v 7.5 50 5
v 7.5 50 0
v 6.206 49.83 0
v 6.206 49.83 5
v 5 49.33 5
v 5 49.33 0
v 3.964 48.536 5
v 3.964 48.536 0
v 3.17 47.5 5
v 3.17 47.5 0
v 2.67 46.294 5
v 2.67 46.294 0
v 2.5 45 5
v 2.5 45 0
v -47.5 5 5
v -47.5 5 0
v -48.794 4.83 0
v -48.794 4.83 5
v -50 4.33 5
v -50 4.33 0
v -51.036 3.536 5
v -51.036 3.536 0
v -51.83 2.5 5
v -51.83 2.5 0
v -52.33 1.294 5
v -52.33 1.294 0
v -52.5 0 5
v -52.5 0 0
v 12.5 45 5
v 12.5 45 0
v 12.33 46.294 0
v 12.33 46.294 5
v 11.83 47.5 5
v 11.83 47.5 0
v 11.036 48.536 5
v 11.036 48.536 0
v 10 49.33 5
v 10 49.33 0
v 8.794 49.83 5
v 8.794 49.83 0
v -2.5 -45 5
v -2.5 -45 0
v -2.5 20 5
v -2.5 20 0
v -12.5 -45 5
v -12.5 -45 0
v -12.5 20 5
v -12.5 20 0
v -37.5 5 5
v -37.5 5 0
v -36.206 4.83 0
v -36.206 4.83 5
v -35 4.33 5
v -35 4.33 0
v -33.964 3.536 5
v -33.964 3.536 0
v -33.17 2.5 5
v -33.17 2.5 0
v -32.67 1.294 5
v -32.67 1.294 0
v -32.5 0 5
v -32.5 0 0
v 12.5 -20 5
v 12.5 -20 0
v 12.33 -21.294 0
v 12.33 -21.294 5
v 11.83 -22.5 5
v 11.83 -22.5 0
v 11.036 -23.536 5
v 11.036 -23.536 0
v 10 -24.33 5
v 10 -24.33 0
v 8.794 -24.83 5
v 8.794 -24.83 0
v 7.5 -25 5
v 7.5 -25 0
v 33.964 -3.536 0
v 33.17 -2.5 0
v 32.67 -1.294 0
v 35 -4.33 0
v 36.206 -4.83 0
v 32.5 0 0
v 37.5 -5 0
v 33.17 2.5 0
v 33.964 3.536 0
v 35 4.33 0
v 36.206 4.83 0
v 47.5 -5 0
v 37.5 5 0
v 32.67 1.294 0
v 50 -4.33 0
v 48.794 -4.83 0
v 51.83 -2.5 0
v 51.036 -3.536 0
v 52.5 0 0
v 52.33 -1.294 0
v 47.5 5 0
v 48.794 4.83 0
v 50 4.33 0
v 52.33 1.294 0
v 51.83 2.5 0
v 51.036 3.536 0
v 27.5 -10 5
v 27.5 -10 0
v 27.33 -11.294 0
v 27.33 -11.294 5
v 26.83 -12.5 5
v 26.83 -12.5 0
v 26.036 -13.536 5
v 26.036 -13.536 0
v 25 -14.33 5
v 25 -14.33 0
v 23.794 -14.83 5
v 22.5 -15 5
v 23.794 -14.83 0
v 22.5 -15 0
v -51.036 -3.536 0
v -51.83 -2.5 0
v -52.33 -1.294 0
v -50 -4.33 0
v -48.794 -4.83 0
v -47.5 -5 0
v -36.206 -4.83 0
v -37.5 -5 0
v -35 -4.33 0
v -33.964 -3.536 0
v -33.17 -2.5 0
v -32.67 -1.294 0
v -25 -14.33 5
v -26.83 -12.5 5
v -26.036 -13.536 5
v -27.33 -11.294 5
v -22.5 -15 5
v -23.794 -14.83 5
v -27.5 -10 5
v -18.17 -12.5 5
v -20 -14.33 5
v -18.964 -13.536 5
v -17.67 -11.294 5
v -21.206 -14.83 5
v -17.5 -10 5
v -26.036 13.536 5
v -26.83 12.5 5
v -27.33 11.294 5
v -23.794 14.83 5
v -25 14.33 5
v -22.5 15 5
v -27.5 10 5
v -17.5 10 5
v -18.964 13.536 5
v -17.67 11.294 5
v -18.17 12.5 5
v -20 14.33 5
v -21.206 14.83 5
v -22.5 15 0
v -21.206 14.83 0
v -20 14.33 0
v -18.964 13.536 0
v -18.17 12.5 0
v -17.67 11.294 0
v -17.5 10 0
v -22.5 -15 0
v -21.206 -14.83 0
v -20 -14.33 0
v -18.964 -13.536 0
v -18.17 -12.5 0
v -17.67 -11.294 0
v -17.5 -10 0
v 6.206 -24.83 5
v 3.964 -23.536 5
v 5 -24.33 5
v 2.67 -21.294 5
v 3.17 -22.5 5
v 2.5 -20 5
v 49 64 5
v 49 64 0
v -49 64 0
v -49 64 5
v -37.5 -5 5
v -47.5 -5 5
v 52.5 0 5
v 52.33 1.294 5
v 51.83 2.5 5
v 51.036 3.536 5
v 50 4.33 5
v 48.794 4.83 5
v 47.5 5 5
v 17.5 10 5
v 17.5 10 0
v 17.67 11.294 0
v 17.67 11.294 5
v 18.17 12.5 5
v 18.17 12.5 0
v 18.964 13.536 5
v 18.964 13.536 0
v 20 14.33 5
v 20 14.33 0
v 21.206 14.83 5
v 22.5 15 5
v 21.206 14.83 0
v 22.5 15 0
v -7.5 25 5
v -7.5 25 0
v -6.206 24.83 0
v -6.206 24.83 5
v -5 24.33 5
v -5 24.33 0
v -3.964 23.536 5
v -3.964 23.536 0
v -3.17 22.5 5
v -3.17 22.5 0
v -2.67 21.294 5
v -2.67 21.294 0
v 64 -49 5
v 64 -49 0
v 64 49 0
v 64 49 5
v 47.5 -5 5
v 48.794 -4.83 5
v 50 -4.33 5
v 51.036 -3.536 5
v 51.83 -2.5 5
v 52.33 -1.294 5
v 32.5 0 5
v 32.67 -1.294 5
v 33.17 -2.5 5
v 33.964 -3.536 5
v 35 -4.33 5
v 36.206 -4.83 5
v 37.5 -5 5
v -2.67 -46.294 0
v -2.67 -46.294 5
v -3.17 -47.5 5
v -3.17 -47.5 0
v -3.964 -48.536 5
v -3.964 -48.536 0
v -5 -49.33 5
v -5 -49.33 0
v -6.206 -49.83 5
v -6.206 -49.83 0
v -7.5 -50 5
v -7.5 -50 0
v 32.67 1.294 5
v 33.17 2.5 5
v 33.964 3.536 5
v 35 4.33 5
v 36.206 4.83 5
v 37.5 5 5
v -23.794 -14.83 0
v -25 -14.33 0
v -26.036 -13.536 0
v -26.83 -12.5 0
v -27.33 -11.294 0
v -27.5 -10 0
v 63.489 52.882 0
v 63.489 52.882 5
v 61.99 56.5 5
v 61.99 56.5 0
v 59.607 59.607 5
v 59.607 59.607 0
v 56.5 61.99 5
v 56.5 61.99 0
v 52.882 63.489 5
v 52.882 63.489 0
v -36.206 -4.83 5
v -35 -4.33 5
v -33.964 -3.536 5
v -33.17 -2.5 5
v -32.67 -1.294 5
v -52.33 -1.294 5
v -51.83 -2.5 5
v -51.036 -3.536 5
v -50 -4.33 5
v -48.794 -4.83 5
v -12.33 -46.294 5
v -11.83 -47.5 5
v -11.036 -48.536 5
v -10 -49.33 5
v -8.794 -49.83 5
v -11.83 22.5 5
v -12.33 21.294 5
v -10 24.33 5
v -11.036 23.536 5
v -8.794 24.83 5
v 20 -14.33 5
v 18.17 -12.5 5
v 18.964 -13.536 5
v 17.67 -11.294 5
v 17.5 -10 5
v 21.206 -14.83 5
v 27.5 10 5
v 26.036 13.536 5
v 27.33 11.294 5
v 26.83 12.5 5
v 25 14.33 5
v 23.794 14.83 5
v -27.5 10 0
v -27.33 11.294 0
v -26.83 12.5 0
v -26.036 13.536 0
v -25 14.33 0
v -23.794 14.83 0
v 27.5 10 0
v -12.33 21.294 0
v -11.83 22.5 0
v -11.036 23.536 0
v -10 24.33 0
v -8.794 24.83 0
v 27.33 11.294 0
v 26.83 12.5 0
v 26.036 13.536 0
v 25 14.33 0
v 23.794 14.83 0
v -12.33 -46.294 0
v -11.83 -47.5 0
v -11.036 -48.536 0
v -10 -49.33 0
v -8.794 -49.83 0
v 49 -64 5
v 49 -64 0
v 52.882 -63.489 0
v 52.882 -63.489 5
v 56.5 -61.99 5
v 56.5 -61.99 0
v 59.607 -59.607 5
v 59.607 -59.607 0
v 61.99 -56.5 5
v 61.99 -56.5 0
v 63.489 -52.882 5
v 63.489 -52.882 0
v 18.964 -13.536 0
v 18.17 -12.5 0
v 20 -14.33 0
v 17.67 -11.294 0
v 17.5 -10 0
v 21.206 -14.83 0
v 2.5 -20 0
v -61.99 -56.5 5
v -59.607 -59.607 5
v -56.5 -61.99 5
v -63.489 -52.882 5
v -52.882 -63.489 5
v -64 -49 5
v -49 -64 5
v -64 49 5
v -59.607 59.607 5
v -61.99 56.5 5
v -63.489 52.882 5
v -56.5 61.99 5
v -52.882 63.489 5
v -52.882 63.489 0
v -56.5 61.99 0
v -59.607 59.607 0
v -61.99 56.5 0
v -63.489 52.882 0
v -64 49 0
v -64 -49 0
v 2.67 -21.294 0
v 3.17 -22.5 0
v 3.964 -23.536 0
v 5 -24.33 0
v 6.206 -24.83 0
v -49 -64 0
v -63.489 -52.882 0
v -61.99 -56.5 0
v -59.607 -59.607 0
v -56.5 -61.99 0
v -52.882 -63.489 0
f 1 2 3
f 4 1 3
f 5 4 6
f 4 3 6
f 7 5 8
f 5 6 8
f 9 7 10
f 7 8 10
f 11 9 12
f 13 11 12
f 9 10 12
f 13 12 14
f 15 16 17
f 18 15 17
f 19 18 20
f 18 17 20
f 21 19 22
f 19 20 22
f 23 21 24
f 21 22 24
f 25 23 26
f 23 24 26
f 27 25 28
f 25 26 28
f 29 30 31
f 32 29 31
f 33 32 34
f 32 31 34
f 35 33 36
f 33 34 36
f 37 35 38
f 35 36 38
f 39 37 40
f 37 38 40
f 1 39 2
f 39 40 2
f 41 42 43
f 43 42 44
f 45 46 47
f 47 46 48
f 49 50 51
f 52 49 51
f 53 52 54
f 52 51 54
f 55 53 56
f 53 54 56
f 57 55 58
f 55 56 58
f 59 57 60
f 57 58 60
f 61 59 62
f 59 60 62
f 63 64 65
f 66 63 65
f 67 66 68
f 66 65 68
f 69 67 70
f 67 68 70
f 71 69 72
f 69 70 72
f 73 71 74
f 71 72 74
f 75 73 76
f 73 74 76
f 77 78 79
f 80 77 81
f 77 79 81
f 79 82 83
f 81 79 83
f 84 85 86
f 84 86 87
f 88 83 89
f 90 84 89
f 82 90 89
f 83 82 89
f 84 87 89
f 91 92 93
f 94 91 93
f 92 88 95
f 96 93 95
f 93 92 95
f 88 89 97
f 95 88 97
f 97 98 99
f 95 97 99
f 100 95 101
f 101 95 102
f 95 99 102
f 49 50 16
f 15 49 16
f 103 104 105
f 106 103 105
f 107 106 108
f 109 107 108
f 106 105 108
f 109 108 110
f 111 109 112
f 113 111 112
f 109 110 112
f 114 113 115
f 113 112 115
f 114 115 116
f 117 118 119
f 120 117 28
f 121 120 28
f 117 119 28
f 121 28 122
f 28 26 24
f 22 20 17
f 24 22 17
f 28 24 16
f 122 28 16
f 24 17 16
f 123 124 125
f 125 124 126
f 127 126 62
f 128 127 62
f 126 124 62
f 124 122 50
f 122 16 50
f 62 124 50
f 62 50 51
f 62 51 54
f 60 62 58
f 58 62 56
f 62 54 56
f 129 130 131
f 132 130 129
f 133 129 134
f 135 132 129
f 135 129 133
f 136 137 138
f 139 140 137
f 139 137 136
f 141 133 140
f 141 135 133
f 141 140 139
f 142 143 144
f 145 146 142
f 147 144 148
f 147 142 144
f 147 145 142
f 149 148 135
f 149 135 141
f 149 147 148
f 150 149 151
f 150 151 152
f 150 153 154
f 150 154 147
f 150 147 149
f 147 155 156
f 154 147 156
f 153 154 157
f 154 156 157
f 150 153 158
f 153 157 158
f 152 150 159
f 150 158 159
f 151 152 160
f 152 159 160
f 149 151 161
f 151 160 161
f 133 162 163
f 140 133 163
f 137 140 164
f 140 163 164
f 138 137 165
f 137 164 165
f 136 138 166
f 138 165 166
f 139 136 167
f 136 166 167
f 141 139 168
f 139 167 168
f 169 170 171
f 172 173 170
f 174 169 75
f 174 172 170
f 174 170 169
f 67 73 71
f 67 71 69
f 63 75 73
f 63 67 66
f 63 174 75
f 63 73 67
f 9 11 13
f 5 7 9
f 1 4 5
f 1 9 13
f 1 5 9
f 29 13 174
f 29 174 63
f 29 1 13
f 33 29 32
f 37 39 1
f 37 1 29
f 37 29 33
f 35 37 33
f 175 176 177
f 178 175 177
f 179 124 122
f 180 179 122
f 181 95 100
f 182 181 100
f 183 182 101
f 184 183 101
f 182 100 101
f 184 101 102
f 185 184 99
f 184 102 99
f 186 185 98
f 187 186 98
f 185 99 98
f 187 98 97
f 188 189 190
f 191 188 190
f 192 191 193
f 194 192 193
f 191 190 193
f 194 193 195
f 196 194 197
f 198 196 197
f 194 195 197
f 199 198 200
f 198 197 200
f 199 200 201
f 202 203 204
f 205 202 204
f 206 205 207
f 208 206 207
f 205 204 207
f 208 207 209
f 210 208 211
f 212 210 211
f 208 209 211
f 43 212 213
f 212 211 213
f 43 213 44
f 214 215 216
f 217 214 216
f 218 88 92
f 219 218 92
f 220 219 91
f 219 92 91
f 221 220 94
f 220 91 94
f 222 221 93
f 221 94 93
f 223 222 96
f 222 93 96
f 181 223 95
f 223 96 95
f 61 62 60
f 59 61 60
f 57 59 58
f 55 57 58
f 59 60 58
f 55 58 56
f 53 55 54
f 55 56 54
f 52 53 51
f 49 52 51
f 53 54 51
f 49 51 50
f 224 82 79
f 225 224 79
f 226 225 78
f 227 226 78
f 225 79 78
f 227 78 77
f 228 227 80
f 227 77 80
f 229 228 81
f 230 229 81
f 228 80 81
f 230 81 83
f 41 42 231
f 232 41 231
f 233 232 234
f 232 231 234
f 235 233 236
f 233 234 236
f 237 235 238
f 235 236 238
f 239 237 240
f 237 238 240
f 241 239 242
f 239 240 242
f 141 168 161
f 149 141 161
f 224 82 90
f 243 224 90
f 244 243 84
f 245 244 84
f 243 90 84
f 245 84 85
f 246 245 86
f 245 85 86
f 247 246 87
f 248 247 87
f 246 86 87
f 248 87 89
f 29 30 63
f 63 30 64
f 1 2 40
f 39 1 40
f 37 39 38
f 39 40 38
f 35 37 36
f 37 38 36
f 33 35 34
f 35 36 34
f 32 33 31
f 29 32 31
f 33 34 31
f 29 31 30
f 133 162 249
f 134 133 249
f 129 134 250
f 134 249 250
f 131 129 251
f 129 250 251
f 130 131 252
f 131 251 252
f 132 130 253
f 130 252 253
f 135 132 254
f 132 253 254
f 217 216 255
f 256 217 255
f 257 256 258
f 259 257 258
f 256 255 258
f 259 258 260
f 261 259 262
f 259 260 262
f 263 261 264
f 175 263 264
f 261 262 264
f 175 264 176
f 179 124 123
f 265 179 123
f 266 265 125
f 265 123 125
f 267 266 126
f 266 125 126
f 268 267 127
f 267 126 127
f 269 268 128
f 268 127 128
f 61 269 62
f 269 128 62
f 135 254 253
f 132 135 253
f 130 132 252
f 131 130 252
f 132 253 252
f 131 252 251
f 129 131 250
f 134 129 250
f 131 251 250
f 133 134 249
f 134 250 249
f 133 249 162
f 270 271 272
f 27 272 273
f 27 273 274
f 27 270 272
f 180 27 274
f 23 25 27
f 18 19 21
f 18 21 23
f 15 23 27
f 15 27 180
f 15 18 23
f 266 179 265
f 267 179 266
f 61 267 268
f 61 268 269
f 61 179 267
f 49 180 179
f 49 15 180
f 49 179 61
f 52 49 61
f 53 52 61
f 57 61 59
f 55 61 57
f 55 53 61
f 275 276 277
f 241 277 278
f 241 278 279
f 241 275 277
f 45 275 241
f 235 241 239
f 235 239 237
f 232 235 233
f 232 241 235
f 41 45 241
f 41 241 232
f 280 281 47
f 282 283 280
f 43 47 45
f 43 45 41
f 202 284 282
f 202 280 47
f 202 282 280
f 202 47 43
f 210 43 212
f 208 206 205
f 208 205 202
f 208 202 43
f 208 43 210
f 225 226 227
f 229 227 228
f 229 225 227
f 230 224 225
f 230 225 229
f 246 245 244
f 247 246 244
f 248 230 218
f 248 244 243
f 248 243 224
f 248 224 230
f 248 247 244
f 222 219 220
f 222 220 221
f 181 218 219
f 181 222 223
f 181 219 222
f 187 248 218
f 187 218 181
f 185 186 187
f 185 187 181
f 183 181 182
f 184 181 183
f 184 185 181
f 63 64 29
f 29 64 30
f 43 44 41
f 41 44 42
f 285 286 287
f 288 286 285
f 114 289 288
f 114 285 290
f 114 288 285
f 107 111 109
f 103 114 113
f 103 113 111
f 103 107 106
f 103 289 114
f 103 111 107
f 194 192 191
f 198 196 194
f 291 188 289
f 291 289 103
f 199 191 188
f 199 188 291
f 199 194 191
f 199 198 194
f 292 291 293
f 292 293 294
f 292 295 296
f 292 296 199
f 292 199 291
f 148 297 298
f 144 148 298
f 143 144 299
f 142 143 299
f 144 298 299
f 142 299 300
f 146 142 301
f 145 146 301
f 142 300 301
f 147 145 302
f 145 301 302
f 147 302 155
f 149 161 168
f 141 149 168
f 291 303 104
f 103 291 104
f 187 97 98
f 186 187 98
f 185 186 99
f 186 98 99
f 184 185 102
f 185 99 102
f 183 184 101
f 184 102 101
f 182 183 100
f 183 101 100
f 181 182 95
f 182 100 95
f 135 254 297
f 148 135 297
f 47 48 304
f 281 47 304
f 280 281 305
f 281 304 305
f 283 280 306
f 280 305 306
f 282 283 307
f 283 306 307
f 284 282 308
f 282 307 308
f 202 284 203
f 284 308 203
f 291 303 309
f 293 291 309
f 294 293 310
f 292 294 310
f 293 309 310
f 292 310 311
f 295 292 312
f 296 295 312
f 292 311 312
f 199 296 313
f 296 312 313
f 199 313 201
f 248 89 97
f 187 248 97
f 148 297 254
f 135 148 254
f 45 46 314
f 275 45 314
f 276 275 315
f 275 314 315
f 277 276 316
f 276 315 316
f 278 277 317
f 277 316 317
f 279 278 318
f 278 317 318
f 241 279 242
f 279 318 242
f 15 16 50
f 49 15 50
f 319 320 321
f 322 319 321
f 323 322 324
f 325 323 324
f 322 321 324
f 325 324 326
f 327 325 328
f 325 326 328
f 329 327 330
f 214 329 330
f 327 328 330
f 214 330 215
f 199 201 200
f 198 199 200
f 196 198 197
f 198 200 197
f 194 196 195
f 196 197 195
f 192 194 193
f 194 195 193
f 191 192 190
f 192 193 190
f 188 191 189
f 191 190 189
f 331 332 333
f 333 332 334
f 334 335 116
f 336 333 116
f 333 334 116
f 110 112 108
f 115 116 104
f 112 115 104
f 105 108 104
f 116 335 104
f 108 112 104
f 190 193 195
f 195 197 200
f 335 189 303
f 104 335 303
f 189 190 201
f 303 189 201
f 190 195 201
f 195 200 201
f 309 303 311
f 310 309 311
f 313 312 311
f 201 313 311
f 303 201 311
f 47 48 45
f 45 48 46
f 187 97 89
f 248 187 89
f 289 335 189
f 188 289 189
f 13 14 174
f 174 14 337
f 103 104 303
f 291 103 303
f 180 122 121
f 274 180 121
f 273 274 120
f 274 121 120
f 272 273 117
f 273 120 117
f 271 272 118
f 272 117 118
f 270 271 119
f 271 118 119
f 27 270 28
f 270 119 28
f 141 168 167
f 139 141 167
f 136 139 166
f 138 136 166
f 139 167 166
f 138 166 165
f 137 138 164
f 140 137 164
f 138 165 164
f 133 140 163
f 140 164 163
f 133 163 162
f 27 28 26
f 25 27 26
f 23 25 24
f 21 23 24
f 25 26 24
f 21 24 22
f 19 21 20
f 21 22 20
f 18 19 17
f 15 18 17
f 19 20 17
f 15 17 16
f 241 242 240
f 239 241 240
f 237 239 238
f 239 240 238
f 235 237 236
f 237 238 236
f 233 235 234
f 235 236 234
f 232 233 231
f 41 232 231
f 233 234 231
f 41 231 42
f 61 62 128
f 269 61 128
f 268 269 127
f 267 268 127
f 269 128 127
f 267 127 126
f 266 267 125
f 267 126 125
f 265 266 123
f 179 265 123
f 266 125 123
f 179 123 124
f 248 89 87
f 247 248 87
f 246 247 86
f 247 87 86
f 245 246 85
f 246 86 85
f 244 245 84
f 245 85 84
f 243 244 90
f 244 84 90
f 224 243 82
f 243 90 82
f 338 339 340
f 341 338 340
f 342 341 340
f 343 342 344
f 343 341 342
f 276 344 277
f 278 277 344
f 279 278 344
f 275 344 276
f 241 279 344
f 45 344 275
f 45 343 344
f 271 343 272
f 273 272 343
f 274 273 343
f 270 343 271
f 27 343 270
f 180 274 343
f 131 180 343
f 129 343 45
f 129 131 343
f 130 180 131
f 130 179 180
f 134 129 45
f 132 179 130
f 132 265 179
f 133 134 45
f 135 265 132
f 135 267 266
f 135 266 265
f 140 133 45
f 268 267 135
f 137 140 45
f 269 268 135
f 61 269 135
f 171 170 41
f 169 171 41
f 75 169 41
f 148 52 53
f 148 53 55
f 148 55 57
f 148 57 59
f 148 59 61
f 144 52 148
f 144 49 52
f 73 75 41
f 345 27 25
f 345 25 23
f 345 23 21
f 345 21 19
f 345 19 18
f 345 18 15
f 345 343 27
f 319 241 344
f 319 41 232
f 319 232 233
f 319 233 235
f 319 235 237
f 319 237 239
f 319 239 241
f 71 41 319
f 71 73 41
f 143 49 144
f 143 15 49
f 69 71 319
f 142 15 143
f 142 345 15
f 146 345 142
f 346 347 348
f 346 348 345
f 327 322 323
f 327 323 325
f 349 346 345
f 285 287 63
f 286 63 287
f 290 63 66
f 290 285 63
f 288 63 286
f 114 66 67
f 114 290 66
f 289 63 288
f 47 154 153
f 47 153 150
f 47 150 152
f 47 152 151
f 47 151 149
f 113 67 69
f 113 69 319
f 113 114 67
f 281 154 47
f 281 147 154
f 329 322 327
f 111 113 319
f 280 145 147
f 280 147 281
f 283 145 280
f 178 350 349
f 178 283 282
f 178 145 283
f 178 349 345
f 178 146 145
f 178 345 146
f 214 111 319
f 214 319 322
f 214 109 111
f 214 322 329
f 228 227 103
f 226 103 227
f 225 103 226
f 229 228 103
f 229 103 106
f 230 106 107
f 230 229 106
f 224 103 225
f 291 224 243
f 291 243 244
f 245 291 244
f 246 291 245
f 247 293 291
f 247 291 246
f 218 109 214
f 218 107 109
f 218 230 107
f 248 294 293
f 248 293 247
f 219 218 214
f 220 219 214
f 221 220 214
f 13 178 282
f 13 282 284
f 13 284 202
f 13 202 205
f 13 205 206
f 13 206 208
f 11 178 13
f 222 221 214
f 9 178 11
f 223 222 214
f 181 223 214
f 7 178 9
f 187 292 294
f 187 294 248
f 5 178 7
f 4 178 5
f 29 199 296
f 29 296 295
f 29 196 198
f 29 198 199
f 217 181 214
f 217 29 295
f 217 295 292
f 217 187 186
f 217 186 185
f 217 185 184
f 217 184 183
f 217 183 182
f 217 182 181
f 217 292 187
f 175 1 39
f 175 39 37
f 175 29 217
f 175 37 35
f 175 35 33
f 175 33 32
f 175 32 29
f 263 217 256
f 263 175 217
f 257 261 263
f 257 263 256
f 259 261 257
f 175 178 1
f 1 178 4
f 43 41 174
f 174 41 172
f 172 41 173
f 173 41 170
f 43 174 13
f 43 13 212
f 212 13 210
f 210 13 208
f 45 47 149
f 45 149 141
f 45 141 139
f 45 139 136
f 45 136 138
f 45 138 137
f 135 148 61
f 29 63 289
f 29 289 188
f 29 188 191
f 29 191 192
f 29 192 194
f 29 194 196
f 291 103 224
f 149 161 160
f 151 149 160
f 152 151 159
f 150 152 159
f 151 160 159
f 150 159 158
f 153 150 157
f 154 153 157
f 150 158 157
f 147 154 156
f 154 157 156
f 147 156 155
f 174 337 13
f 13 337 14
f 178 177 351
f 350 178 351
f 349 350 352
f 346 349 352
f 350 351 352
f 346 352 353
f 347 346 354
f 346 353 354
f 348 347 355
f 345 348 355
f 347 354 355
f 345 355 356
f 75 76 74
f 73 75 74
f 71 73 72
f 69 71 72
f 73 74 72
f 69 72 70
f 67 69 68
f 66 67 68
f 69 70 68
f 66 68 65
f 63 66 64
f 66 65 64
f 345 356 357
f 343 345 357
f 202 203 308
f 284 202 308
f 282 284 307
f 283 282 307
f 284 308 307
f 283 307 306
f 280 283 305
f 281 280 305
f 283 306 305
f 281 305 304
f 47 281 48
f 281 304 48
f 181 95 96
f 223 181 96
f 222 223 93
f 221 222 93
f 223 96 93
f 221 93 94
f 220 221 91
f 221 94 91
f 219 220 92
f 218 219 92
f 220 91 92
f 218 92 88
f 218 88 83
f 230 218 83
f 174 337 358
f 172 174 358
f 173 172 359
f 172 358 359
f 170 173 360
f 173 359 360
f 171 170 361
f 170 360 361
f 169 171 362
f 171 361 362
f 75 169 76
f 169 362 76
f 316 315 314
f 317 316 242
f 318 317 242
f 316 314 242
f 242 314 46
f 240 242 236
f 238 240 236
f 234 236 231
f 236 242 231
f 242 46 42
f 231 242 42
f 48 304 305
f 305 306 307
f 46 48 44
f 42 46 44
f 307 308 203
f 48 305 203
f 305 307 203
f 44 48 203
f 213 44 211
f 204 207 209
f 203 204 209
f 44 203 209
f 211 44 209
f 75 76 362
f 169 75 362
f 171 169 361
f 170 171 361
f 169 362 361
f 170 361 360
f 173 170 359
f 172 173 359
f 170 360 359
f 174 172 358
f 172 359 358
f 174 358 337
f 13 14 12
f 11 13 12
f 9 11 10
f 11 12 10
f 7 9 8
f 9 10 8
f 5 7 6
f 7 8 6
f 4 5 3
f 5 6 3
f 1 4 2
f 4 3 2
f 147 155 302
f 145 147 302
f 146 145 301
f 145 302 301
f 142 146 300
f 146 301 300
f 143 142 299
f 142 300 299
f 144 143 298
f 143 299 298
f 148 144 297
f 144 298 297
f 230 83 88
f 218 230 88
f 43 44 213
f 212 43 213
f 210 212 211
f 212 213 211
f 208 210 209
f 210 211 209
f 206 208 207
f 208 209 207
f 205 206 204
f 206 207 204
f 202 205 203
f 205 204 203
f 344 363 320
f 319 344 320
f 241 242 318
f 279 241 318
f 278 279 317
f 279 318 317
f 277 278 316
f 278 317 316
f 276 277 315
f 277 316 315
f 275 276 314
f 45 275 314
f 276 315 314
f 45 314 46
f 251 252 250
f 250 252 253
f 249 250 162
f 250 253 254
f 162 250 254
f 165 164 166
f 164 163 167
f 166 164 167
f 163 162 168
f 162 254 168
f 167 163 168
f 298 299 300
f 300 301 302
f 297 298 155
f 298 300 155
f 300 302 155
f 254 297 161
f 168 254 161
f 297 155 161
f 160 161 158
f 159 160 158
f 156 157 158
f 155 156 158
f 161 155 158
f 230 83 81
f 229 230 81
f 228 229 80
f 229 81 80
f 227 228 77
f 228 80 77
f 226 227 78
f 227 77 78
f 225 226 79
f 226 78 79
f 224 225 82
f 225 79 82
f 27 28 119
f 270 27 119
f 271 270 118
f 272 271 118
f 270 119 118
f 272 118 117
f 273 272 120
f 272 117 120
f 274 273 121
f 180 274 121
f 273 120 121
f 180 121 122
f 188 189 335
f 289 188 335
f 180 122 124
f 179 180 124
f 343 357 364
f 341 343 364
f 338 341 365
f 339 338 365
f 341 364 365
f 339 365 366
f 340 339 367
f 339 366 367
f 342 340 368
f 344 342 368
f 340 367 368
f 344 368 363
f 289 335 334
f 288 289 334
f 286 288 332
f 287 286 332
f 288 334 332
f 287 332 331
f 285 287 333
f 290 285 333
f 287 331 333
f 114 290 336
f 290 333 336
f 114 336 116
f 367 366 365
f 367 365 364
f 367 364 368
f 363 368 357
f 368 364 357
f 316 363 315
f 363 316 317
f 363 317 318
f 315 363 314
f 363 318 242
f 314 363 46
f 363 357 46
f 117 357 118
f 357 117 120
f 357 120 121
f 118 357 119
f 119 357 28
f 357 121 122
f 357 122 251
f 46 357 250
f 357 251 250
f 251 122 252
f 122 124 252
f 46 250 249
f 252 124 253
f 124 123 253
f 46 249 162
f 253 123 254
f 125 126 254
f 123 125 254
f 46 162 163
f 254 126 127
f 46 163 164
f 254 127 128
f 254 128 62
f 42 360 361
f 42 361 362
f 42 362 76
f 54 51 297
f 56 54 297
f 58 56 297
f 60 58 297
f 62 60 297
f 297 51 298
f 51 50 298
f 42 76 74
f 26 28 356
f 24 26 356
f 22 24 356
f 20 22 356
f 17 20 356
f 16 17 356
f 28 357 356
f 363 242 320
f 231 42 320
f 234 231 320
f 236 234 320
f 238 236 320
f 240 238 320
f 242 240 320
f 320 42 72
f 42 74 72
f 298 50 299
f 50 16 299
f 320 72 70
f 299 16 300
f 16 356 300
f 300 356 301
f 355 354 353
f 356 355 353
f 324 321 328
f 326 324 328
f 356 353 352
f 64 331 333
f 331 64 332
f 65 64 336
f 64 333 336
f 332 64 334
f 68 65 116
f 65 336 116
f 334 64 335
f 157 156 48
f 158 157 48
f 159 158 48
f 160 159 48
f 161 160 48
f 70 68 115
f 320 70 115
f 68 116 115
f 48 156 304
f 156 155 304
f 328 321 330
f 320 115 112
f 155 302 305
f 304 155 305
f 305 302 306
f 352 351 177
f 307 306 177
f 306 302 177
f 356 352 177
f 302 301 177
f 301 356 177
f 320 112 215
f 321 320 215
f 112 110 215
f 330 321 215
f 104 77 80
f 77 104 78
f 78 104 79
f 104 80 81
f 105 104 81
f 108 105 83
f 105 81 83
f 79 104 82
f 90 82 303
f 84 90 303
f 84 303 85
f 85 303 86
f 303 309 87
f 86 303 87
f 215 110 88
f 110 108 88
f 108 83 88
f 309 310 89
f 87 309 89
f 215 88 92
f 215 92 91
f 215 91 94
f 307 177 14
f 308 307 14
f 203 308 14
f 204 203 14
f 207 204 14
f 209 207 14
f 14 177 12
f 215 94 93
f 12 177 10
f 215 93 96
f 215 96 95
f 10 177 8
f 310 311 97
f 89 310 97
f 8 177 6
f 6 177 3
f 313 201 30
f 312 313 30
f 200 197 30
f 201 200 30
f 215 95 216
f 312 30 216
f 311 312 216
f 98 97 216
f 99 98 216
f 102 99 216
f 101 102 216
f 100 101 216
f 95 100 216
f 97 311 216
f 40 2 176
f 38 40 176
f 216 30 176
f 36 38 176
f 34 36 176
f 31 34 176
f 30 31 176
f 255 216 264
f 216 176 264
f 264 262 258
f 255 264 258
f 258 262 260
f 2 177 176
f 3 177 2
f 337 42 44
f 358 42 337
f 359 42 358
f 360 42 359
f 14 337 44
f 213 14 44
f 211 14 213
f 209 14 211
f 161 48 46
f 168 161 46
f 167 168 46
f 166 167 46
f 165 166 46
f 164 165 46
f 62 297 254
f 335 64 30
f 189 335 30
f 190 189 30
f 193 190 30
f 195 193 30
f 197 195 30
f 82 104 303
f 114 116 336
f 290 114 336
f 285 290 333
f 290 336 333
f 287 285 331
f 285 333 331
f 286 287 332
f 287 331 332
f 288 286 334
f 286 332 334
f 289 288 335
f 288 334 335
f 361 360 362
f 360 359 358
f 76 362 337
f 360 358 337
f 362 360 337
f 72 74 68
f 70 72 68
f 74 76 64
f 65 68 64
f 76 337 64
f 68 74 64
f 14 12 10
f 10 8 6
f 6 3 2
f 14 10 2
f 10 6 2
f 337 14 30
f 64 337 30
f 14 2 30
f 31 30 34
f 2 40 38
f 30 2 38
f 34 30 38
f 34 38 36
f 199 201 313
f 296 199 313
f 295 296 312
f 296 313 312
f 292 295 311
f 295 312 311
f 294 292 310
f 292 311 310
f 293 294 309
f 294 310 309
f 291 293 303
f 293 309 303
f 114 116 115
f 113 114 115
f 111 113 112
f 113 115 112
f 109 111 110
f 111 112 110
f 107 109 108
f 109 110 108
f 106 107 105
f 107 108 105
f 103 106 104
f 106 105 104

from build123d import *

# Parameters (mm, degrees)
F1_DEPTH = 5
F2_DEPTH = 5
F3_DEPTH = 5
F4_DEPTH = 5
F5_DEPTH = 5
F6_DEPTH = 5
F7_DEPTH = 5


with BuildPart() as f1:
    # F0 (on Top) → F1 (new body)
    with BuildSketch(Plane.XY):
        with BuildLine():
            ThreePointArc((64, 49), (59.606602, 59.606602), (49, 64))
            Line((49, 64), (-49, 64))
            ThreePointArc((-49, 64), (-59.606602, 59.606602), (-64, 49))
            Line((-64, 49), (-64, -49))
            ThreePointArc((-64, -49), (-59.606602, -59.606602), (-49, -64))
            Line((-49, -64), (49, -64))
            ThreePointArc((49, -64), (59.606602, -59.606602), (64, -49))
            Line((64, -49), (64, 49))
        make_face()
        with BuildLine():
            ThreePointArc((-7.5, 25), (-3.964466, 23.535534), (-2.5, 20))
            Line((-2.5, 20), (-2.5, -25))
            Line((-2.5, -25), (-2.5, -45))
            ThreePointArc((-2.5, -45), (-3.964466, -48.535534), (-7.5, -50))
            ThreePointArc((-7.5, -50), (-11.035534, -48.535534), (-12.5, -45))
            Line((-12.5, -45), (-12.5, -25))
            Line((-12.5, -25), (-12.5, 20))
            ThreePointArc((-12.5, 20), (-11.035534, 23.535534), (-7.5, 25))
        make_face(mode=Mode.SUBTRACT)
        with BuildLine():
            Line((-47.5, 5), (-37.5, 5))
            ThreePointArc((-37.5, 5), (-33.964466, 3.535534), (-32.5, 0))
            ThreePointArc((-32.5, 0), (-33.964466, -3.535534), (-37.5, -5))
            Line((-37.5, -5), (-47.5, -5))
            ThreePointArc((-47.5, -5), (-51.035534, -3.535534), (-52.5, 0))
            ThreePointArc((-52.5, 0), (-51.035534, 3.535534), (-47.5, 5))
        make_face(mode=Mode.SUBTRACT)
        with BuildLine():
            ThreePointArc((-22.5, 15), (-18.964466, 13.535534), (-17.5, 10))
            Line((-17.5, 10), (-17.5, -10))
            ThreePointArc((-17.5, -10), (-18.964466, -13.535534), (-22.5, -15))
            ThreePointArc((-22.5, -15), (-26.035534, -13.535534), (-27.5, -10))
            Line((-27.5, -10), (-27.5, 10))
            ThreePointArc((-27.5, 10), (-26.035534, 13.535534), (-22.5, 15))
        make_face(mode=Mode.SUBTRACT)
        with BuildLine():
            ThreePointArc((7.5, -25), (3.964466, -23.535534), (2.5, -20))
            Line((2.5, -20), (2.5, 25))
            Line((2.5, 25), (2.5, 45))
            ThreePointArc((2.5, 45), (3.964466, 48.535534), (7.5, 50))
            ThreePointArc((7.5, 50), (11.035534, 48.535534), (12.5, 45))
            Line((12.5, 45), (12.5, 25))
            Line((12.5, 25), (12.5, -20))
            ThreePointArc((12.5, -20), (11.035534, -23.535534), (7.5, -25))
        make_face(mode=Mode.SUBTRACT)
        with BuildLine():
            Line((27.5, 10), (27.5, -10))
            ThreePointArc((27.5, -10), (26.035534, -13.535534), (22.5, -15))
            ThreePointArc((22.5, -15), (18.964466, -13.535534), (17.5, -10))
            Line((17.5, -10), (17.5, 10))
            ThreePointArc((17.5, 10), (18.964466, 13.535534), (22.5, 15))
            ThreePointArc((22.5, 15), (26.035534, 13.535534), (27.5, 10))
        make_face(mode=Mode.SUBTRACT)
        with BuildLine():
            Line((47.5, -5), (37.5, -5))
            ThreePointArc((37.5, -5), (33.964466, -3.535534), (32.5, 0))
            ThreePointArc((32.5, 0), (33.964466, 3.535534), (37.5, 5))
            Line((37.5, 5), (47.5, 5))
            ThreePointArc((47.5, 5), (51.035534, 3.535534), (52.5, 0))
            ThreePointArc((52.5, 0), (51.035534, -3.535534), (47.5, -5))
        make_face(mode=Mode.SUBTRACT)
    extrude(amount=F1_DEPTH)


with BuildPart() as f2:
    # F0 (on Top) → F2 (new body)
    with BuildSketch(Plane.XY):
        with BuildLine():
            ThreePointArc((-32.5, 0), (-33.964466, 3.535534), (-37.5, 5))
            Line((-37.5, 5), (-47.5, 5))
            ThreePointArc((-47.5, 5), (-51.035534, 3.535534), (-52.5, 0))
            ThreePointArc((-52.5, 0), (-51.035534, -3.535534), (-47.5, -5))
            Line((-47.5, -5), (-37.5, -5))
            ThreePointArc((-37.5, -5), (-33.964466, -3.535534), (-32.5, 0))
        make_face()
    extrude(amount=F2_DEPTH)


with BuildPart() as f3:
    # F0 (on Top) → F3 (new body)
    with BuildSketch(Plane.XY):
        with BuildLine():
            Line((-17.5, -10), (-17.5, 10))
            ThreePointArc((-17.5, 10), (-18.964466, 13.535534), (-22.5, 15))
            ThreePointArc((-22.5, 15), (-26.035534, 13.535534), (-27.5, 10))
            Line((-27.5, 10), (-27.5, -10))
            ThreePointArc((-27.5, -10), (-26.035534, -13.535534), (-22.5, -15))
            ThreePointArc((-22.5, -15), (-18.964466, -13.535534), (-17.5, -10))
        make_face()
    extrude(amount=F3_DEPTH)


with BuildPart() as f4:
    # F0 (on Top) → F4 (new body)
    with BuildSketch(Plane.XY):
        with BuildLine():
            Line((-2.5, -25), (-2.5, 20))
            ThreePointArc((-2.5, 20), (-3.964466, 23.535534), (-7.5, 25))
            ThreePointArc((-7.5, 25), (-11.035534, 23.535534), (-12.5, 20))
            Line((-12.5, 20), (-12.5, -25))
            Line((-12.5, -25), (-12.5, -45))
            ThreePointArc((-12.5, -45), (-11.035534, -48.535534), (-7.5, -50))
            ThreePointArc((-7.5, -50), (-3.964466, -48.535534), (-2.5, -45))
            Line((-2.5, -45), (-2.5, -25))
        make_face()
    extrude(amount=F4_DEPTH)


with BuildPart() as f5:
    # F0 (on Top) → F5 (new body)
    with BuildSketch(Plane.XY):
        with BuildLine():
            Line((2.5, 25), (2.5, -20))
            ThreePointArc((2.5, -20), (3.964466, -23.535534), (7.5, -25))
            ThreePointArc((7.5, -25), (11.035534, -23.535534), (12.5, -20))
            Line((12.5, -20), (12.5, 25))
            Line((12.5, 25), (12.5, 45))
            ThreePointArc((12.5, 45), (11.035534, 48.535534), (7.5, 50))
            ThreePointArc((7.5, 50), (3.964466, 48.535534), (2.5, 45))
            Line((2.5, 45), (2.5, 25))
        make_face()
    extrude(amount=F5_DEPTH)


with BuildPart() as f6:
    # F0 (on Top) → F6 (new body)
    with BuildSketch(Plane.XY):
        with BuildLine():
            ThreePointArc((22.5, -15), (26.035534, -13.535534), (27.5, -10))
            Line((27.5, -10), (27.5, 10))
            ThreePointArc((27.5, 10), (26.035534, 13.535534), (22.5, 15))
            ThreePointArc((22.5, 15), (18.964466, 13.535534), (17.5, 10))
            Line((17.5, 10), (17.5, -10))
            ThreePointArc((17.5, -10), (18.964466, -13.535534), (22.5, -15))
        make_face()
    extrude(amount=F6_DEPTH)


with BuildPart() as f7:
    # F0 (on Top) → F7 (new body)
    with BuildSketch(Plane.XY):
        with BuildLine():
            ThreePointArc((32.5, 0), (33.964466, -3.535534), (37.5, -5))
            Line((37.5, -5), (47.5, -5))
            ThreePointArc((47.5, -5), (51.035534, -3.535534), (52.5, 0))
            ThreePointArc((52.5, 0), (51.035534, 3.535534), (47.5, 5))
            Line((47.5, 5), (37.5, 5))
            ThreePointArc((37.5, 5), (33.964466, 3.535534), (32.5, 0))
        make_face()
    extrude(amount=F7_DEPTH)


solid = Compound([f1.part, f2.part, f3.part, f4.part, f5.part, f6.part, f7.part])
